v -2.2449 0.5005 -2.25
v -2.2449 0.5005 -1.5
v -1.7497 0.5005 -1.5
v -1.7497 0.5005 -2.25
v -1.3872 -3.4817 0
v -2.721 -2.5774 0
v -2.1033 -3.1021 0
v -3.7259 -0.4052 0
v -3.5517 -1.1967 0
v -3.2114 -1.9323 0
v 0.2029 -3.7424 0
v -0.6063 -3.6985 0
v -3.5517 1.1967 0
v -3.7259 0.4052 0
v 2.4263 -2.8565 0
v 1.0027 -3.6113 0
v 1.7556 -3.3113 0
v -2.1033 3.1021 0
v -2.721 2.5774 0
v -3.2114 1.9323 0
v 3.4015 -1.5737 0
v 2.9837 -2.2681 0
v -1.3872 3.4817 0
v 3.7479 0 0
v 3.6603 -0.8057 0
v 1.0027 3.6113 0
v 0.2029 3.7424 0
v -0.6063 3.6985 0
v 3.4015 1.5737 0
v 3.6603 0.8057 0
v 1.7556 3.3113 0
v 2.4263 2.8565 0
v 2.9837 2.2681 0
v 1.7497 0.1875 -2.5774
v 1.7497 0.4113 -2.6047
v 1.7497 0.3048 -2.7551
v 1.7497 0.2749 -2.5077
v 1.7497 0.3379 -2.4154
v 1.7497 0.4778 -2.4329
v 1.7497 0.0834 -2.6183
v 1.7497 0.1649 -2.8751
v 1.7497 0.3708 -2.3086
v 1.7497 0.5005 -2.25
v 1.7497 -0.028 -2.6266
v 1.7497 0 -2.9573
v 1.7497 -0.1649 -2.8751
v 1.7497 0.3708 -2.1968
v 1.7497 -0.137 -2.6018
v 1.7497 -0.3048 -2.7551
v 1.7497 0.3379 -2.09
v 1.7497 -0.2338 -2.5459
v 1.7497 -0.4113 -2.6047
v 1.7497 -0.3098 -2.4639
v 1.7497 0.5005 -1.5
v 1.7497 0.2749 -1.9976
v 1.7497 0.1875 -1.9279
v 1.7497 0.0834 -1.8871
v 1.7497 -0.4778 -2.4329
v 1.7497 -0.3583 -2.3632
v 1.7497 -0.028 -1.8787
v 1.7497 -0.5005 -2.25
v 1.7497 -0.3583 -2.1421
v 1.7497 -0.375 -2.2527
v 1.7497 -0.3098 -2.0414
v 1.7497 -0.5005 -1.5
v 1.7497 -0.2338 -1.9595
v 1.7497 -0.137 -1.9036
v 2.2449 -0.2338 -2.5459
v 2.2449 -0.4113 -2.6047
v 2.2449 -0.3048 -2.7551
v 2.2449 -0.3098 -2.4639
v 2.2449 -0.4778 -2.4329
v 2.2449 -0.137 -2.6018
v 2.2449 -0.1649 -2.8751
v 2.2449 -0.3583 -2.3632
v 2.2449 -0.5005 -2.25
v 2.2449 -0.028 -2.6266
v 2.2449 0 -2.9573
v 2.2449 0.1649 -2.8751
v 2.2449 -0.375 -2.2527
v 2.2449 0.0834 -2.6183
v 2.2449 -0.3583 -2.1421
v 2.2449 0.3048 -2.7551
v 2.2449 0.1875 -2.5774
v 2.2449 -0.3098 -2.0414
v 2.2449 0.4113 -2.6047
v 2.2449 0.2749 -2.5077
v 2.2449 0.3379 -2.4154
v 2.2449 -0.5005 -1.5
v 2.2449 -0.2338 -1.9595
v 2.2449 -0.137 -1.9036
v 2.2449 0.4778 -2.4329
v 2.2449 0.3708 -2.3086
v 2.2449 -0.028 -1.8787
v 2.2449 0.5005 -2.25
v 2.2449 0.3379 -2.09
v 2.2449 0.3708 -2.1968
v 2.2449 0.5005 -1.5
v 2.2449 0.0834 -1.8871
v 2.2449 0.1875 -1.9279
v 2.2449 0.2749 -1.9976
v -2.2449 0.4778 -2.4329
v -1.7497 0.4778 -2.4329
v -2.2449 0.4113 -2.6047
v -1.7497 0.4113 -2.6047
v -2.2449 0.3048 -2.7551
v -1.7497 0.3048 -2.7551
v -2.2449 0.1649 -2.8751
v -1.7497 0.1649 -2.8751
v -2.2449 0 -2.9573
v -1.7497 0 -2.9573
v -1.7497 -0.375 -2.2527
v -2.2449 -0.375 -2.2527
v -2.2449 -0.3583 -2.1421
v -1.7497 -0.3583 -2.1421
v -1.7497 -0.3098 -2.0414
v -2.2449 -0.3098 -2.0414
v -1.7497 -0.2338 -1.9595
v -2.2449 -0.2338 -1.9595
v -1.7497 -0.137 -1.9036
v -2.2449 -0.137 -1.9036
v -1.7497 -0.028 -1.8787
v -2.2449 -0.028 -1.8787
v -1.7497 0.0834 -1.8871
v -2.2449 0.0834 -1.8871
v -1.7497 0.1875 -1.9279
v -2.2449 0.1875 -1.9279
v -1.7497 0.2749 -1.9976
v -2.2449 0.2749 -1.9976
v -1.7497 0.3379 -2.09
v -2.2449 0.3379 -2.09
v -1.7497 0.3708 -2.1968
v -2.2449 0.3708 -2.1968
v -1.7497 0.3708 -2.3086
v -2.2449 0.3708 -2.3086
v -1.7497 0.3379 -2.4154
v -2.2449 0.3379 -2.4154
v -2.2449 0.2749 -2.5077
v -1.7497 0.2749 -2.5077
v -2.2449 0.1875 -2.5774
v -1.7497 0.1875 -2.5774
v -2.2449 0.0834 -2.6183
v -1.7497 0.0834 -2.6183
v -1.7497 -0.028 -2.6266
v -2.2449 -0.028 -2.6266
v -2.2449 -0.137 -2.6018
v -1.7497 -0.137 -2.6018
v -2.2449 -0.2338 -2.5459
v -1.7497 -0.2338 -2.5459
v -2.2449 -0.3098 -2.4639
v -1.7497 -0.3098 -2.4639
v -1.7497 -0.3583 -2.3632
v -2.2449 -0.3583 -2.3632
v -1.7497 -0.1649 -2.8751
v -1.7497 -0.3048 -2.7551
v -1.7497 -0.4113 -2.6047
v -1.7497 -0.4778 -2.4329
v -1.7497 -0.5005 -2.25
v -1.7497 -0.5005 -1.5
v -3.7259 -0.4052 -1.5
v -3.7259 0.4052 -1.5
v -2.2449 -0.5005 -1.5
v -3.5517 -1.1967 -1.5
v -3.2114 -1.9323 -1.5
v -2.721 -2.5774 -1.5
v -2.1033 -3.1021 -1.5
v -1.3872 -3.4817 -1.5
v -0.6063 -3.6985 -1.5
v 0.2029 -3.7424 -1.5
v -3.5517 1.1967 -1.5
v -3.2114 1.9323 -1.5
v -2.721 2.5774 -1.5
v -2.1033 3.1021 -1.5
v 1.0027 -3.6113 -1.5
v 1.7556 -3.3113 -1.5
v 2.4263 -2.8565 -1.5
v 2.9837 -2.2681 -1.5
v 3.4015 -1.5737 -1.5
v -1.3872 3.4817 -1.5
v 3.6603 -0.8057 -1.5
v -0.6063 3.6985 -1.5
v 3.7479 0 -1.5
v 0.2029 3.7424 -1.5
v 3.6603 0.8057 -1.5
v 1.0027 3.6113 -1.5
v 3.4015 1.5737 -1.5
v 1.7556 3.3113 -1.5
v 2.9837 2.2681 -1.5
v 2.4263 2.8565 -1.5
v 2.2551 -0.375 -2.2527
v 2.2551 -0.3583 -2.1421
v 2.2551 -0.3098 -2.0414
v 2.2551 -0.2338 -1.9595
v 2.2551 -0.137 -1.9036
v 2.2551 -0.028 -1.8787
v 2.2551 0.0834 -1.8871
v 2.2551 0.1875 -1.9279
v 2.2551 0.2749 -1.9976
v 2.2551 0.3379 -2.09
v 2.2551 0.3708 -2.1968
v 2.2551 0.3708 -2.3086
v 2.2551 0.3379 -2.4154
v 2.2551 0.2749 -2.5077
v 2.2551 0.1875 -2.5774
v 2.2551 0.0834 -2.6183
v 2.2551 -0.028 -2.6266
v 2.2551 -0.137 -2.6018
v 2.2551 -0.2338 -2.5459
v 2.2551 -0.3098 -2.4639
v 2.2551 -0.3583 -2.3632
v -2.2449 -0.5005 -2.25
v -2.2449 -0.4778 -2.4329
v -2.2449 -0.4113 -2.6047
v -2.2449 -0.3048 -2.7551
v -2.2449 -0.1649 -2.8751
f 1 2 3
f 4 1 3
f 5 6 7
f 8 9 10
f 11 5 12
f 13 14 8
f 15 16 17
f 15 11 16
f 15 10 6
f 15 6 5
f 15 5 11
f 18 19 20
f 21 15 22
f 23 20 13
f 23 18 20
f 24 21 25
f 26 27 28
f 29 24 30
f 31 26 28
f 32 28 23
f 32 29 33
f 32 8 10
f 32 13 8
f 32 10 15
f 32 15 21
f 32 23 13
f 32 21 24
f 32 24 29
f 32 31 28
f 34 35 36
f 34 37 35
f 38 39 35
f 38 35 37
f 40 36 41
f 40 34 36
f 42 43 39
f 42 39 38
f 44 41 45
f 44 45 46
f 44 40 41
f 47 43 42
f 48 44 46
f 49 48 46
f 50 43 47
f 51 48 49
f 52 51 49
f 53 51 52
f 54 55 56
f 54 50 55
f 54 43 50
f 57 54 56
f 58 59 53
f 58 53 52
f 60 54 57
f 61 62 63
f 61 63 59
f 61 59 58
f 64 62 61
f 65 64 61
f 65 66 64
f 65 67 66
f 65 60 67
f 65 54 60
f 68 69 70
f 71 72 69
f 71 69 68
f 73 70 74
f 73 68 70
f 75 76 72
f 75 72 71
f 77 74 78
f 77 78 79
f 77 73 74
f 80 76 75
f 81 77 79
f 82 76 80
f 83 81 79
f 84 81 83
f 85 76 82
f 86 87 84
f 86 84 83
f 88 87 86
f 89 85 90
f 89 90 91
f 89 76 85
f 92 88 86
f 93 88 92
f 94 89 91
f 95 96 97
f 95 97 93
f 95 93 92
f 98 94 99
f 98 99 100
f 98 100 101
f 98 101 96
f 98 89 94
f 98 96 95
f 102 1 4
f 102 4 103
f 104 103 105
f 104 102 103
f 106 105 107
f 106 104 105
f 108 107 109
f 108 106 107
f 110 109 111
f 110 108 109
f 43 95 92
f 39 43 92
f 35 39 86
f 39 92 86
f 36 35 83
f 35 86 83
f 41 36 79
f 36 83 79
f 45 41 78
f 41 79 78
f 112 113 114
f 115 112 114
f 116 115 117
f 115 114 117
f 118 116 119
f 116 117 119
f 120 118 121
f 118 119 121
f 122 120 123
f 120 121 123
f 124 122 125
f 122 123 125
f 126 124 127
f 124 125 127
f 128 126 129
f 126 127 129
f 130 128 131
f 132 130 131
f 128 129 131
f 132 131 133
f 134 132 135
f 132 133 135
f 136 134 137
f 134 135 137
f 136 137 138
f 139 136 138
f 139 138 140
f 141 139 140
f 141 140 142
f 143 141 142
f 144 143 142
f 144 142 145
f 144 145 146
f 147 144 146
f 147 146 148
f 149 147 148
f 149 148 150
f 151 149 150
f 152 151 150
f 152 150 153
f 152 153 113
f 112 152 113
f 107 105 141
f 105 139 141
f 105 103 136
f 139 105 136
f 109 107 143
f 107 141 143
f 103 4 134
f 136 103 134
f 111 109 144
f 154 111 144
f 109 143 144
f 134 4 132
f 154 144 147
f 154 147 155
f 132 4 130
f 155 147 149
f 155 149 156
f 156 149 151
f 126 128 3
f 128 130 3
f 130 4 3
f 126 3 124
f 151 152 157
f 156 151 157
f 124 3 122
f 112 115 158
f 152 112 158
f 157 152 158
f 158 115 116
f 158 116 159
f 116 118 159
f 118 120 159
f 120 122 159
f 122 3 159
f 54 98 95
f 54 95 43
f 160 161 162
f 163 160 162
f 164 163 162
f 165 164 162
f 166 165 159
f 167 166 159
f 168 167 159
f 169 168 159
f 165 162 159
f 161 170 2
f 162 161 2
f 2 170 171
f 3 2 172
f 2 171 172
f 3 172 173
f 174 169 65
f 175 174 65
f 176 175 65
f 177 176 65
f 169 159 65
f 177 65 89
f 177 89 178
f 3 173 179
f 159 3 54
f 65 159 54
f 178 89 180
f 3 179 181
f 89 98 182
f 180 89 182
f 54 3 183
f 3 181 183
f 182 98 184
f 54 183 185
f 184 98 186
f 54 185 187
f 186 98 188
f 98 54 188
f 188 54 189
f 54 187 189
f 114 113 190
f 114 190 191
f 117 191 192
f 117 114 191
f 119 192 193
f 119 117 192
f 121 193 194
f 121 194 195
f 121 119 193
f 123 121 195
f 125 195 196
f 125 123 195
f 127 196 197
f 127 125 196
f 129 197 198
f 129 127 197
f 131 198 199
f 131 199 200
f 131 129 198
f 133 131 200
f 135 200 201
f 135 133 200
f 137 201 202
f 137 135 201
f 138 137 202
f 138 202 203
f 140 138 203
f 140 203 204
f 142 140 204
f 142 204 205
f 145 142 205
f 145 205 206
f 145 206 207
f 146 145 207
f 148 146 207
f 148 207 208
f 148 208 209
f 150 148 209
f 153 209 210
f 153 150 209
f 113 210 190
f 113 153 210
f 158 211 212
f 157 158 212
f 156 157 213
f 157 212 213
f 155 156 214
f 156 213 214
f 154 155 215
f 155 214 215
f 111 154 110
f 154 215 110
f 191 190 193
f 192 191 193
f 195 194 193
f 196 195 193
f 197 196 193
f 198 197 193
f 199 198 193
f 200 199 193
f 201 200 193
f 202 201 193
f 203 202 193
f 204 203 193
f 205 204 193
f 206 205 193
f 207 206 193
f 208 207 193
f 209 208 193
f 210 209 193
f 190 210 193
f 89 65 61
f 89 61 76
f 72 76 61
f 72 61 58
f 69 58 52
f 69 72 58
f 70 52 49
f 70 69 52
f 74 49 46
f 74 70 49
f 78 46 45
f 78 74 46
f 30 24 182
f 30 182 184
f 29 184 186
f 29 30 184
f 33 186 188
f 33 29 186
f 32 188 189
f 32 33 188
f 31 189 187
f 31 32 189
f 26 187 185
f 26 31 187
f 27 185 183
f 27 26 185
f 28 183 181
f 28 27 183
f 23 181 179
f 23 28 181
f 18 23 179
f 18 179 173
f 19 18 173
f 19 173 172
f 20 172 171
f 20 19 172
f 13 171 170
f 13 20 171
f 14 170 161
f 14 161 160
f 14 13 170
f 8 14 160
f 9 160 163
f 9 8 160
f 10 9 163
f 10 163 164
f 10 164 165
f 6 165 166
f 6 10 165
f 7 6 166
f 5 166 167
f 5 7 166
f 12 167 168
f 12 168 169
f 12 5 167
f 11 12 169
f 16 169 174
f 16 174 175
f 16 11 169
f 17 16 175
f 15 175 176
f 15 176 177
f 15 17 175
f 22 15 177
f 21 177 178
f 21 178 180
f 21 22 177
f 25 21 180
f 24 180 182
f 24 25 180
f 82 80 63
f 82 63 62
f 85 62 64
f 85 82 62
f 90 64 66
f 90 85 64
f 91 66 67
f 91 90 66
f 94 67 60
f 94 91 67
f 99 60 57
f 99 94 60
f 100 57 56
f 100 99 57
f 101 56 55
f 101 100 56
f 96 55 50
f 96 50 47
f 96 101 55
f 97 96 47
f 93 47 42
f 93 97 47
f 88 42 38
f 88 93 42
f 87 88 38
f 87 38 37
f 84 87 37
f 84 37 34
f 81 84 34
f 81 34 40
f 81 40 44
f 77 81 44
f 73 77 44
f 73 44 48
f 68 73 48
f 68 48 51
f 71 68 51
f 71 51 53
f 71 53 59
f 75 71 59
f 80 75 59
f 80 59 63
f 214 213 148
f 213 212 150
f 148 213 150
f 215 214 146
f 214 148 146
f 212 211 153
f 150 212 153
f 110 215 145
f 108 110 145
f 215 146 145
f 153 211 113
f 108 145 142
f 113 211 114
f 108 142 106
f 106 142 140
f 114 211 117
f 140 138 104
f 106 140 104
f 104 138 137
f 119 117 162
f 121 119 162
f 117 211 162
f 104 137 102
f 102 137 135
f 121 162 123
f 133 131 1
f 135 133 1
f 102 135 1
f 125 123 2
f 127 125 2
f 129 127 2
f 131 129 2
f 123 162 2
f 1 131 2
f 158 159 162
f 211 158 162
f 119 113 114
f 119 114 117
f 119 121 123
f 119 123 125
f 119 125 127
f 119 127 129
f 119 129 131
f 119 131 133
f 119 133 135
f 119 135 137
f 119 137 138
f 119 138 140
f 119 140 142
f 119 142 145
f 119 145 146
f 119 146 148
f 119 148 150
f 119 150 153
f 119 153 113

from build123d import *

# Parameters (mm, degrees)
F0_R        = 3.7479112611
F1_DEPTH    = 1.5
F3_DEPTH    = 1.5
F5_D        = 0.75
F6_T1_DEPTH = 4.2451243754
F8_R        = 0.375
F9_DEPTH    = 4.5


# Not quite as in the source:
# - a fillet or chamfer that OpenCascade refuses, or shapes differently, is made with other operations: its cross-section is extruded or revolved along the edge and cut away or added


with BuildPart() as f1:
    # F0 (on Top) → F1 (new body)
    with BuildSketch(Plane.XY):
        Circle(F0_R)
    extrude(amount=-F1_DEPTH)

    # F2 (on face) → F3 (join)
    with BuildSketch(Plane(origin=(0, 0, -1.5), x_dir=(1, 0, 0), z_dir=(0, 0, -1))):
        Polygon((-2.2448661039, -0.5004639388), (-1.7497417284, -0.5004639388), (-1.7497417284, 0), (-1.7497417284, 0.5004639388), (-2.2448661039, 0.5004639388), align=None)
    extrude(amount=F3_DEPTH)

    # F5 (through all)
    with Locations(Plane.YZ.offset(-1.7497417284)):
        with Locations((0, -2.2526816465)):
            Hole(F5_D / 2)

    # F6: fillet of radius 0.75 on 2 edges, made by hand

    # F6_s2 → F6_t1 (cut)
    with BuildSketch(Plane.YZ.offset(-4.1198661039)):
        with BuildLine():
            ThreePointArc((-0.5004639388, -2.25), (-0.2807940247, -2.7803300859), (0.2495360612, -3))
            Line((0.2495360612, -3), (-0.5004639388, -3))
            Line((-0.5004639388, -3), (-0.5004639388, -2.25))
        make_face()
        with BuildLine():
            ThreePointArc((0.5004639388, -2.25), (0.2807940247, -2.7803300859), (-0.2495360612, -3))
            Line((-0.2495360612, -3), (0.5004639388, -3))
            Line((0.5004639388, -3), (0.5004639388, -2.25))
        make_face()
    extrude(amount=F6_T1_DEPTH, mode=Mode.SUBTRACT)

    # F7: F1 across plane


with BuildPart() as f1_1:
    add(f1.part)
    add(f1.part.mirror(Plane.YZ))


with BuildPart() as f9:
    # F8 (on face) → F9 (new body)
    with BuildSketch(Plane(origin=(-2.2448661039, 0, 0), x_dir=(0, -1, 0), z_dir=(-1, 0, 0))):
        with Locations((0, -2.2526816465)):
            Circle(F8_R)
    extrude(amount=-F9_DEPTH)


solid = Compound([f1_1.part, f9.part])
